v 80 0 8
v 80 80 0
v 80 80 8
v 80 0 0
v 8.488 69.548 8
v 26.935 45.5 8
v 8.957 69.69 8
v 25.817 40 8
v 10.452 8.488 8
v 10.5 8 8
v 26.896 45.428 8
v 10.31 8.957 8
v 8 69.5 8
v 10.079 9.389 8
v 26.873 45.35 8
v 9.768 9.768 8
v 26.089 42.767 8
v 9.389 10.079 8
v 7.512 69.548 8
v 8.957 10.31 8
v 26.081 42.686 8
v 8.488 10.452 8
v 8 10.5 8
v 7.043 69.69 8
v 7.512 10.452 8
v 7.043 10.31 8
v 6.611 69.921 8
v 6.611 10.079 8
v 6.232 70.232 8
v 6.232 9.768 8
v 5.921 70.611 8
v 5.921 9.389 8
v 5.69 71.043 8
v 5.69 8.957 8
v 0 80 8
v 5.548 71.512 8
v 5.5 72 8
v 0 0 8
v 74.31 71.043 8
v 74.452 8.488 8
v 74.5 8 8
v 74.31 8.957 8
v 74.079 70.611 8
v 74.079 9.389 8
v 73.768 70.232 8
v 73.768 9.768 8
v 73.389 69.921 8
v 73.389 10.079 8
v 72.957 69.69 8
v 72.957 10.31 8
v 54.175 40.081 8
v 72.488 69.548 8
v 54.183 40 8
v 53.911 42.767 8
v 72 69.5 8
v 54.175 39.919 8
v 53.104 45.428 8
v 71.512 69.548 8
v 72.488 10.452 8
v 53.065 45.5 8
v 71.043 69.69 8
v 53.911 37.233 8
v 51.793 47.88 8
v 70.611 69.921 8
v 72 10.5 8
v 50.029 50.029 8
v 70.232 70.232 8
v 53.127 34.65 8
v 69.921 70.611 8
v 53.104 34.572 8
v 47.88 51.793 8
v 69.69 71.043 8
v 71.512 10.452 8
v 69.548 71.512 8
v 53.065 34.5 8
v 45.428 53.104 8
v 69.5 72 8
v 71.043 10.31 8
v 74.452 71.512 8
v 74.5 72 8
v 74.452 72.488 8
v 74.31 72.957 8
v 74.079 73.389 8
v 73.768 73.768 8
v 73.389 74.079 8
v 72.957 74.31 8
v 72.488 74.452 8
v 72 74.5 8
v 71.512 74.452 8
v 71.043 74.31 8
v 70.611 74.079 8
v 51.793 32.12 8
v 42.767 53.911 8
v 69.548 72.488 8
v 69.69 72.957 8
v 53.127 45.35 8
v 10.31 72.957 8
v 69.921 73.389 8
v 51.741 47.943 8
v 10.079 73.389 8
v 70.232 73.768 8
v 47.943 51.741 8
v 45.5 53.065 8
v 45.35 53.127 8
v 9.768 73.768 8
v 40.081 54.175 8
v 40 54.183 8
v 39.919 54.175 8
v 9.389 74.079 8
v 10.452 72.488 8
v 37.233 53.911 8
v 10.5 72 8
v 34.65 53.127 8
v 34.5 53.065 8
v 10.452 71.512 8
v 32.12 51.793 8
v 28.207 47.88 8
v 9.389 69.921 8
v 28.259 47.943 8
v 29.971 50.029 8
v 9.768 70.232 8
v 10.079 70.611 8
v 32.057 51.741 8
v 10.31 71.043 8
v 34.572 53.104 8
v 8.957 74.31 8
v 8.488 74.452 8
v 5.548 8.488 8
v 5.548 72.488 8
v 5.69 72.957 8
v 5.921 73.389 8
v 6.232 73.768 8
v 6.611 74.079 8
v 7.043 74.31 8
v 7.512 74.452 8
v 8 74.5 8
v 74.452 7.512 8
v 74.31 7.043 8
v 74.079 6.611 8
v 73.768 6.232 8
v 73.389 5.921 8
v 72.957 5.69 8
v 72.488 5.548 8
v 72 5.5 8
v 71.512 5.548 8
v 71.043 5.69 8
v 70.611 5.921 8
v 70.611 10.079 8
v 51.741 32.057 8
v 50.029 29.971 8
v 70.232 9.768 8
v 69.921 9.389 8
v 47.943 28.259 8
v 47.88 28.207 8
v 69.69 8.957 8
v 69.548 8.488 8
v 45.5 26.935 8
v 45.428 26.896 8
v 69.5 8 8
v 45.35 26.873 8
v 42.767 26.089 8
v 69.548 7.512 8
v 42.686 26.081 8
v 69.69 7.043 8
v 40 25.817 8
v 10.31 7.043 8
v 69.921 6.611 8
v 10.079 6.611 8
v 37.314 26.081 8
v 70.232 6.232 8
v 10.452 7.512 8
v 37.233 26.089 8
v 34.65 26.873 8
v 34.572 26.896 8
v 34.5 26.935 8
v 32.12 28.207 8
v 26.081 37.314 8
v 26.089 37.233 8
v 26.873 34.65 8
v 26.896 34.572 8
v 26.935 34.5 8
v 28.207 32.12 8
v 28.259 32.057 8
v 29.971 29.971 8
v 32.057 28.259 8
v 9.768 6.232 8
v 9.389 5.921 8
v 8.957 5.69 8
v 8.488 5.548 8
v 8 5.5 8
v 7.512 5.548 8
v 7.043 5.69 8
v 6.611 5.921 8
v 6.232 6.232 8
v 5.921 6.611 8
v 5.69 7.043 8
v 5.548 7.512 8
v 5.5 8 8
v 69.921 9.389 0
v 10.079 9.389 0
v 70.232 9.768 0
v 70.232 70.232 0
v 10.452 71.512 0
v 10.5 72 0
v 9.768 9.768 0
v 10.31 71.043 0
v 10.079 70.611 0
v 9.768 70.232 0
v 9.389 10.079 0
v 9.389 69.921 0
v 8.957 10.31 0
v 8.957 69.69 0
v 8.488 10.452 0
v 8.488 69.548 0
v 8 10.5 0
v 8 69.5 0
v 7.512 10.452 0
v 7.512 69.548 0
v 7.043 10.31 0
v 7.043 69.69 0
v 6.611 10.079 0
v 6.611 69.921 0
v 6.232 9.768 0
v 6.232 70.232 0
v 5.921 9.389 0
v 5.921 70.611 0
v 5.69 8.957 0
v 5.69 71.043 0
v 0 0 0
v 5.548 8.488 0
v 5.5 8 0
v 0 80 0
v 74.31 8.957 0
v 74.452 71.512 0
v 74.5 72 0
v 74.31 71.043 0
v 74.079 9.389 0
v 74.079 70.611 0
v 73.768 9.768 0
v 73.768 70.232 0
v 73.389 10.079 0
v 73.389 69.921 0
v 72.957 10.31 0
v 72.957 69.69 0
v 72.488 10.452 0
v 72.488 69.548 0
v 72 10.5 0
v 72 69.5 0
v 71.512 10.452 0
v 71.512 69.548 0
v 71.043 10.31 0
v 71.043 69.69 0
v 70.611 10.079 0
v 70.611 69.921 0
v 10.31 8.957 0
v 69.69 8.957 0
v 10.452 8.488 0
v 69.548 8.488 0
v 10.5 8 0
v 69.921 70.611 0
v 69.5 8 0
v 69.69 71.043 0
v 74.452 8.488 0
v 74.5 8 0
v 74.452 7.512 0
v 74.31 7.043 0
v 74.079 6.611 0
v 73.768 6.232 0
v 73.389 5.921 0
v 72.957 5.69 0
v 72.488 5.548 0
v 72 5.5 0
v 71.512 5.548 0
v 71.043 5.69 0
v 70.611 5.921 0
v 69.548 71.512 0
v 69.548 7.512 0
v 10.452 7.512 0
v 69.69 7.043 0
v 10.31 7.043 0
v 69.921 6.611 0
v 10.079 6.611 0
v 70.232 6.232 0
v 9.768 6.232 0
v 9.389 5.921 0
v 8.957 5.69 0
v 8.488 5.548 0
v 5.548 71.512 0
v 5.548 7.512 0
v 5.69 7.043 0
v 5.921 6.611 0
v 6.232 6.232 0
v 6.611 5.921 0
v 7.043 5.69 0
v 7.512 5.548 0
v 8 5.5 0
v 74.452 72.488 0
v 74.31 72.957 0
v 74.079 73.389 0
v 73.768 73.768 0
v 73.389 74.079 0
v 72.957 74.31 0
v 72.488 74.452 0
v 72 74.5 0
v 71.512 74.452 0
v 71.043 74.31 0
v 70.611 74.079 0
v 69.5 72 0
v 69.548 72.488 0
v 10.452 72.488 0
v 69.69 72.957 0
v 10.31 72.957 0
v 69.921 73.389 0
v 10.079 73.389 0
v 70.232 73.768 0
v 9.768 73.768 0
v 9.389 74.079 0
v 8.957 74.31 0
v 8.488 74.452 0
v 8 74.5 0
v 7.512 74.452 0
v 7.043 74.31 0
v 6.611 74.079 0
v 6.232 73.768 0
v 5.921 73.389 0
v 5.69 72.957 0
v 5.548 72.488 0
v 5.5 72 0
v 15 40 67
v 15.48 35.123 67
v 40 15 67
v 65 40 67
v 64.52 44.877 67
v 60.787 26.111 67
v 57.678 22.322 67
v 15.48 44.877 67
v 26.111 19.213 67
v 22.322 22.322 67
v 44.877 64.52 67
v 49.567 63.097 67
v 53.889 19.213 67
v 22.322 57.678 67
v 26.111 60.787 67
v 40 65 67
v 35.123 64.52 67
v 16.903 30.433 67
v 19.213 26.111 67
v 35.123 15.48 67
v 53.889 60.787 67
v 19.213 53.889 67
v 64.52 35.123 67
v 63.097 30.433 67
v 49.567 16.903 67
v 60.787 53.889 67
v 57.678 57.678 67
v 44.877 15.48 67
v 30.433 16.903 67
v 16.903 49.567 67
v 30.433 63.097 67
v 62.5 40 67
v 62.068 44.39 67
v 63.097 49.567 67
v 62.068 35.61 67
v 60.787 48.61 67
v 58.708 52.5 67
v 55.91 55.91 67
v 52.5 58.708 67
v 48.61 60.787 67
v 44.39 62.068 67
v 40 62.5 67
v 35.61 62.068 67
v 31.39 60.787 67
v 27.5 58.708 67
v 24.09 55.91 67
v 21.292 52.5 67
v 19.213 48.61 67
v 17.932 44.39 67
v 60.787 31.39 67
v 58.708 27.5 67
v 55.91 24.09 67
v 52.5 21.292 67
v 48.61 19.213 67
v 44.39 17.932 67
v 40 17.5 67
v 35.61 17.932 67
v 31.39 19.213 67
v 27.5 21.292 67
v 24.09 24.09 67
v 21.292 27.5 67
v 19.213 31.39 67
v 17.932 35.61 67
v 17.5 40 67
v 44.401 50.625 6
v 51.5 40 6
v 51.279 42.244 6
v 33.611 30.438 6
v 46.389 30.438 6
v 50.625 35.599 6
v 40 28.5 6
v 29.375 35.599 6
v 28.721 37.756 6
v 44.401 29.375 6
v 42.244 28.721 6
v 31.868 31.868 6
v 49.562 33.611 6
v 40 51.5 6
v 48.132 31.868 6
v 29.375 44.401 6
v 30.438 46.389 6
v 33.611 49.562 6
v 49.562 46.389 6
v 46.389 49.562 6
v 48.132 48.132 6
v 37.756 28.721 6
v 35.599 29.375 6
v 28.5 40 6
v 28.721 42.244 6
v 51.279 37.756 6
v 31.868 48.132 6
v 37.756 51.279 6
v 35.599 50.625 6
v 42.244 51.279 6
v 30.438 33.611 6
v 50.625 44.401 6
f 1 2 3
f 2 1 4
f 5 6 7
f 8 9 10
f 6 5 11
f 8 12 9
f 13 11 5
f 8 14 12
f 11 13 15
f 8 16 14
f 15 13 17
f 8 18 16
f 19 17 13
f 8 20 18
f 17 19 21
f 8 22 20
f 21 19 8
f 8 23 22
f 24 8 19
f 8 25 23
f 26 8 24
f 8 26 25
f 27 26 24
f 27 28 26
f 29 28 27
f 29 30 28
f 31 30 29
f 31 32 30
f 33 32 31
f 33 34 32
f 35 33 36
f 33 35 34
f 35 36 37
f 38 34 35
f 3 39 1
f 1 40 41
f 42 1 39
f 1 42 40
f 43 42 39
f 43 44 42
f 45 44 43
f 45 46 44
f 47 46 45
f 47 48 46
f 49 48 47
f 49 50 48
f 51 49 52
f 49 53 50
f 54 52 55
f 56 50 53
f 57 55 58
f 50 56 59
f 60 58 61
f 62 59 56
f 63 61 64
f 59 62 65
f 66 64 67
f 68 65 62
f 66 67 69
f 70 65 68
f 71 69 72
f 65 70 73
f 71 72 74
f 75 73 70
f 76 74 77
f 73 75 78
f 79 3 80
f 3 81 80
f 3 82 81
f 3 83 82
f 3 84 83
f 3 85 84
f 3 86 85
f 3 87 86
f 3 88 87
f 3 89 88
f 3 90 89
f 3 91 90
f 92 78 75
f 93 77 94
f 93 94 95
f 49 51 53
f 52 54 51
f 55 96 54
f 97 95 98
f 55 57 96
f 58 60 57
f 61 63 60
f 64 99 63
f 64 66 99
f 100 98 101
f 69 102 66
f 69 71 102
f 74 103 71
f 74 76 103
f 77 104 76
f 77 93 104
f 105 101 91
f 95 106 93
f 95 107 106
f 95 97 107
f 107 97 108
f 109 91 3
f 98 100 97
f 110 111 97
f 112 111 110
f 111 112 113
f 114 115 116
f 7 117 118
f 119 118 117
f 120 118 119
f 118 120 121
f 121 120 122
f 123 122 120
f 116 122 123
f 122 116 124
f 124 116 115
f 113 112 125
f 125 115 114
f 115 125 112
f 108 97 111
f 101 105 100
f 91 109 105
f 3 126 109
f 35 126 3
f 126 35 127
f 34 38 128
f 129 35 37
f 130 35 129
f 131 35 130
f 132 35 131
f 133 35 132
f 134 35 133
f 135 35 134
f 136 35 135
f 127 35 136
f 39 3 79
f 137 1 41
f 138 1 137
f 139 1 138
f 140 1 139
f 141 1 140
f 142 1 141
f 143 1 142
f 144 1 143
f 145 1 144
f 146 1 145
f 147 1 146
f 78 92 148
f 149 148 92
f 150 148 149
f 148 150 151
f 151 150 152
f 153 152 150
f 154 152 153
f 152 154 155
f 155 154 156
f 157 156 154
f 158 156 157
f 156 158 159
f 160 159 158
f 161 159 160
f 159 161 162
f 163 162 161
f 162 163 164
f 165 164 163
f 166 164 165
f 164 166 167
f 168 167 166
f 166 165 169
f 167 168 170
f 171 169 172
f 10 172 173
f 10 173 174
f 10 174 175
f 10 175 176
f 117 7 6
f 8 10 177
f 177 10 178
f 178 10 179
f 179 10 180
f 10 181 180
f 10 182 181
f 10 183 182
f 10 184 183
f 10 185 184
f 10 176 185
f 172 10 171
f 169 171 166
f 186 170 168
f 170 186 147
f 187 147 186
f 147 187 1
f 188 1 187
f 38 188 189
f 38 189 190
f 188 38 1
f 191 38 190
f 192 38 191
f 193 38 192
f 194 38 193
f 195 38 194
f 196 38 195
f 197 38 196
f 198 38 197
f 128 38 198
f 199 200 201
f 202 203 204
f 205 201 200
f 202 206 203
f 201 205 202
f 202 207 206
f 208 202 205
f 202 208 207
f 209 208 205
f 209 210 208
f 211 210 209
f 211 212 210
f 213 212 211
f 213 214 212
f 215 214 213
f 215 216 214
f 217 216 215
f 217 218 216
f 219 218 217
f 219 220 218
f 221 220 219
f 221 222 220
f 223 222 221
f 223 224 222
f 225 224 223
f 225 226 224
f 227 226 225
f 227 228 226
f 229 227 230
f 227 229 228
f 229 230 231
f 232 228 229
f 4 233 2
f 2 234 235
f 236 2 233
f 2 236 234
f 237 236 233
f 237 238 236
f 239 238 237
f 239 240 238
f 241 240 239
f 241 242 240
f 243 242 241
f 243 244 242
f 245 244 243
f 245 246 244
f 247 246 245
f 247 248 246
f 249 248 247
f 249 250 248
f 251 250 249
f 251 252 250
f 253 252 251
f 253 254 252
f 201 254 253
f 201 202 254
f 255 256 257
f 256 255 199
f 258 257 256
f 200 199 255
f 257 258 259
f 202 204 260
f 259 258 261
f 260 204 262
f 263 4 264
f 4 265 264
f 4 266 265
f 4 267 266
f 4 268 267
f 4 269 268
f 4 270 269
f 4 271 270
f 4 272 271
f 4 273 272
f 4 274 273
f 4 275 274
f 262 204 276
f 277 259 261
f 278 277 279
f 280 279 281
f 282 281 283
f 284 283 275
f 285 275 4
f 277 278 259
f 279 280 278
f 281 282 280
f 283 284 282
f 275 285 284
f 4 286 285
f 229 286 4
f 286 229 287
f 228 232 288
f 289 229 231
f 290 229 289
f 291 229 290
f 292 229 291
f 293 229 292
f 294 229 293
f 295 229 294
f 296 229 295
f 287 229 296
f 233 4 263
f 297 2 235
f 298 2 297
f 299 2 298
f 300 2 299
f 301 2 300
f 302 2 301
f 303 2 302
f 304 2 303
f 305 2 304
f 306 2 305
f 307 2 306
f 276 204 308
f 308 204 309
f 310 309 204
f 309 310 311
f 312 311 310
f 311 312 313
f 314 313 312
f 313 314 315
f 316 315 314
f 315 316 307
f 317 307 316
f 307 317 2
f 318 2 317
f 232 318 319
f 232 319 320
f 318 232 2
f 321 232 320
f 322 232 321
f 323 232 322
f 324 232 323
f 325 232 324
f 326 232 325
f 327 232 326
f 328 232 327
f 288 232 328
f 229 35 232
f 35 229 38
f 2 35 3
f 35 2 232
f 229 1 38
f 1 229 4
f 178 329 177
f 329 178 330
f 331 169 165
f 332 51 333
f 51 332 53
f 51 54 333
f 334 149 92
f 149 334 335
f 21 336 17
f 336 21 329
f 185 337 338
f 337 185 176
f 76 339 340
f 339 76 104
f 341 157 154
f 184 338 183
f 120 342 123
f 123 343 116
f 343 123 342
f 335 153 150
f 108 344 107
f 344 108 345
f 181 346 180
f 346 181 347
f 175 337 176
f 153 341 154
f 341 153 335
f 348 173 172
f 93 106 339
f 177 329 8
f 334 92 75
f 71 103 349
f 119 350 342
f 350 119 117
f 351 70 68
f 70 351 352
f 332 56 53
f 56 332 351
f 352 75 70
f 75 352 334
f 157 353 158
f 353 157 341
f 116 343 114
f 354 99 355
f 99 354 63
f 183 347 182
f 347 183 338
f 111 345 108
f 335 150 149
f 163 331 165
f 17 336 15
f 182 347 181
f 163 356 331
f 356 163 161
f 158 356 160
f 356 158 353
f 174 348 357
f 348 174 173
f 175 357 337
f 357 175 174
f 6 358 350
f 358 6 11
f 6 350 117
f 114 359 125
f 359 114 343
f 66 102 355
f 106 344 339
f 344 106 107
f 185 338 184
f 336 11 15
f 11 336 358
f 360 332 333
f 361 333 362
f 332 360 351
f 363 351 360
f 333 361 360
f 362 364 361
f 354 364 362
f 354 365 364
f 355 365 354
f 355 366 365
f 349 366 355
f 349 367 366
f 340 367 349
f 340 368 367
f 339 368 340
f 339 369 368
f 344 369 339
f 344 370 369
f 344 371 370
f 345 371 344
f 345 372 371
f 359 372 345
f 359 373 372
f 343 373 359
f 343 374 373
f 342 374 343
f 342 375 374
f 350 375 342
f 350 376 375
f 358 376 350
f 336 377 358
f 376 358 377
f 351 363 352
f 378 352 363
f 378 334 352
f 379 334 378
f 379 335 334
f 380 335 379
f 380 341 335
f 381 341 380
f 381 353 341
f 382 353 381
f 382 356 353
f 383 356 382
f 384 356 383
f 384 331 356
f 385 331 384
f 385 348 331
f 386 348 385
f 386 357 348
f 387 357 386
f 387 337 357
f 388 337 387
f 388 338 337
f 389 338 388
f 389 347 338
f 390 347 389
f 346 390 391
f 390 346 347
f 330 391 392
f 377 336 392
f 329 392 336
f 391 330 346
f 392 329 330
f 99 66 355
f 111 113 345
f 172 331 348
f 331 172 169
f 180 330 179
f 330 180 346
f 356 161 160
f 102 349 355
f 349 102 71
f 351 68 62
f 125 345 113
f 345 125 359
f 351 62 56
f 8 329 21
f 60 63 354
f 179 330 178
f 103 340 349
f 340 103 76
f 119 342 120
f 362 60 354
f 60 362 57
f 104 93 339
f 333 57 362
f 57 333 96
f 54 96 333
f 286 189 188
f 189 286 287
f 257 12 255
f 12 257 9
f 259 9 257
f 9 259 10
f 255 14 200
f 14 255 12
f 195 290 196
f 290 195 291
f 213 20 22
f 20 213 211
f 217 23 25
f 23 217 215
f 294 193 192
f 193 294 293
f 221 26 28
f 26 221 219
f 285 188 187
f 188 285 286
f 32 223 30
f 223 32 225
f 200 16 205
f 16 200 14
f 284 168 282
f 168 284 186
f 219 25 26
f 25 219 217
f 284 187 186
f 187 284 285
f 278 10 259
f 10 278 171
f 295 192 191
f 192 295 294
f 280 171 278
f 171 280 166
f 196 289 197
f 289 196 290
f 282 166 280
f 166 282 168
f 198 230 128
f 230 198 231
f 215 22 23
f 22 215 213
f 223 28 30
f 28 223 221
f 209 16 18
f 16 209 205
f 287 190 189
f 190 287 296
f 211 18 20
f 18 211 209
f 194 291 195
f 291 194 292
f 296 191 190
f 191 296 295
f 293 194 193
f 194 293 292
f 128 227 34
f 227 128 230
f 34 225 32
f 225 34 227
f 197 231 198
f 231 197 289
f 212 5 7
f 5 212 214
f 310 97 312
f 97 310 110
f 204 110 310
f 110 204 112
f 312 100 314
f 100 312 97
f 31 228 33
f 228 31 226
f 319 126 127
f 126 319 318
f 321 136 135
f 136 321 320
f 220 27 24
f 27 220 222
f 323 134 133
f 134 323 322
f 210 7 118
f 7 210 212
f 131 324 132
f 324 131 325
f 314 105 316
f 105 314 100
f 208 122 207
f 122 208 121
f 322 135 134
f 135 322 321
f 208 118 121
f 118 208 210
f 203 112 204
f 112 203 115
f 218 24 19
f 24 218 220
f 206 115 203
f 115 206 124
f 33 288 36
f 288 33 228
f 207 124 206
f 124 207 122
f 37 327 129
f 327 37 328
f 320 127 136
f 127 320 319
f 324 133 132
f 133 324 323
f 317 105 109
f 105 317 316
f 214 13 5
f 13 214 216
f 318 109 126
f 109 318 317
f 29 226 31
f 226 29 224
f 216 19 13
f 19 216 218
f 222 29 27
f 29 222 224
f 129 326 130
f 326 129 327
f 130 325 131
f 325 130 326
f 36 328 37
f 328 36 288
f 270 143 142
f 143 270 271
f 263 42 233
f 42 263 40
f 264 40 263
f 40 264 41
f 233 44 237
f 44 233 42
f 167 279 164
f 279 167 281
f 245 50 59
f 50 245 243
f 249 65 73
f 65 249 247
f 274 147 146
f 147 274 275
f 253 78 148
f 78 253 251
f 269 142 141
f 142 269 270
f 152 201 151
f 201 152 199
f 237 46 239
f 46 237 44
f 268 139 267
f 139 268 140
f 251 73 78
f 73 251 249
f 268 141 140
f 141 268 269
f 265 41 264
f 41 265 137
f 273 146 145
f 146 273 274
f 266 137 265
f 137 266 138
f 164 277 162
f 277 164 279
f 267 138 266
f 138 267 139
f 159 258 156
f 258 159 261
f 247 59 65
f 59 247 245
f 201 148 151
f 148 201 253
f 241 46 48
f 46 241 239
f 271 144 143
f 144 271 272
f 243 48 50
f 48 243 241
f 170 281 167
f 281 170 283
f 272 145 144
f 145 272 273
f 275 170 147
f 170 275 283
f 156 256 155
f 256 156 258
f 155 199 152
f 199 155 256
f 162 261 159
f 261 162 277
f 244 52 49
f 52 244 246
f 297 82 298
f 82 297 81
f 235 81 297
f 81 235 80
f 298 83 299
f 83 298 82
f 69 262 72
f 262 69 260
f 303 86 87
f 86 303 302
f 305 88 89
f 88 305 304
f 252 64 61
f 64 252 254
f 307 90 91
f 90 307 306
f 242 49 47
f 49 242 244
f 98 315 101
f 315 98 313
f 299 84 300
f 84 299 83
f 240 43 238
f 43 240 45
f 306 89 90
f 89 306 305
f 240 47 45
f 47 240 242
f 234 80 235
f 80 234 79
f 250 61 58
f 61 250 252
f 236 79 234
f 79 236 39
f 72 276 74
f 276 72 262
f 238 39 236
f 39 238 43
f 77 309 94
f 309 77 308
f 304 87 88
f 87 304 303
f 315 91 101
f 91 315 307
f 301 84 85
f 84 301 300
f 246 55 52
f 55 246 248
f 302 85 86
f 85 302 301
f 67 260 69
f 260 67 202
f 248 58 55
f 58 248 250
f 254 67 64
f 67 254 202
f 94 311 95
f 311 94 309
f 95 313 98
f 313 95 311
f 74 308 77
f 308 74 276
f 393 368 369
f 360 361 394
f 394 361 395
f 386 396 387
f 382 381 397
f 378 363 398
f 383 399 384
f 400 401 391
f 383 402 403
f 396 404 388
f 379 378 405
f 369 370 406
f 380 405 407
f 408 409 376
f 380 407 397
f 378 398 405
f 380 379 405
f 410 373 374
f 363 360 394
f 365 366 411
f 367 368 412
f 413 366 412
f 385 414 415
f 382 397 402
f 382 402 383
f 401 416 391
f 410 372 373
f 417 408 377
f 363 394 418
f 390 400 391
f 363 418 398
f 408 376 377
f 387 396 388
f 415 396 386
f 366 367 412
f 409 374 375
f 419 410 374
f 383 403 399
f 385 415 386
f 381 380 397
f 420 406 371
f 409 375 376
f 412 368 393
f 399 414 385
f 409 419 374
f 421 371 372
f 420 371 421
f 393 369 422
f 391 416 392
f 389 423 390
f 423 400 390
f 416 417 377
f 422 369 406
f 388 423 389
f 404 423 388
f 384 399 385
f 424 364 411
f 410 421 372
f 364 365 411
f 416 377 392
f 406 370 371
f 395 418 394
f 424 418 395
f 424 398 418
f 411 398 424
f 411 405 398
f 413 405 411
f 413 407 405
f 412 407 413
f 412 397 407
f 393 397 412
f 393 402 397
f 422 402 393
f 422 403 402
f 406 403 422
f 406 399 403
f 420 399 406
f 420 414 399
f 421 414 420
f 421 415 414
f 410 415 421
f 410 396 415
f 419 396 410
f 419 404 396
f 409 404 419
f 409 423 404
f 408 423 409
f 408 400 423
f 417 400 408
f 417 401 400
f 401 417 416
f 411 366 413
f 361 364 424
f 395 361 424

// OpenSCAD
$fn = 32;

// ----------------------------------------------------------------------
// Hopper: flanged with square flange
// ----------------------------------------------------------------------

// --- parameters (mm) ---
fl = 80;                  // flange side, X and Y
fl_t = 8;                 // flange thickness
cone_h = 60;              // cone height above the flange
top_d = 50;               // cone mouth diameter
bot_d = 28;               // cone spout diameter
wall = 2.5;               // cone wall thickness
hole_r = 2.5;             // flange hole radius
hole_in = 8;              // hole inset from the corners

bore_d = bot_d - 2 * wall;  // spout bore diameter
total_h = fl_t + cone_h - 1;  // overall height

difference() {
  union() {
    cube([fl, fl, fl_t]);
    translate([fl / 2, fl / 2, fl_t - 1])
      cylinder(h = cone_h, d1 = bot_d, d2 = top_d);
  }
  translate([fl / 2, fl / 2, fl_t - 2])
    cylinder(h = cone_h + 1, d1 = bore_d, d2 = top_d - 2 * wall);
  for (sx = [0, 1], sy = [0, 1])
    translate([sx ? fl - hole_in : hole_in,
               sy ? fl - hole_in : hole_in, -1])
      cylinder(r = hole_r, h = fl_t + 2);
}
